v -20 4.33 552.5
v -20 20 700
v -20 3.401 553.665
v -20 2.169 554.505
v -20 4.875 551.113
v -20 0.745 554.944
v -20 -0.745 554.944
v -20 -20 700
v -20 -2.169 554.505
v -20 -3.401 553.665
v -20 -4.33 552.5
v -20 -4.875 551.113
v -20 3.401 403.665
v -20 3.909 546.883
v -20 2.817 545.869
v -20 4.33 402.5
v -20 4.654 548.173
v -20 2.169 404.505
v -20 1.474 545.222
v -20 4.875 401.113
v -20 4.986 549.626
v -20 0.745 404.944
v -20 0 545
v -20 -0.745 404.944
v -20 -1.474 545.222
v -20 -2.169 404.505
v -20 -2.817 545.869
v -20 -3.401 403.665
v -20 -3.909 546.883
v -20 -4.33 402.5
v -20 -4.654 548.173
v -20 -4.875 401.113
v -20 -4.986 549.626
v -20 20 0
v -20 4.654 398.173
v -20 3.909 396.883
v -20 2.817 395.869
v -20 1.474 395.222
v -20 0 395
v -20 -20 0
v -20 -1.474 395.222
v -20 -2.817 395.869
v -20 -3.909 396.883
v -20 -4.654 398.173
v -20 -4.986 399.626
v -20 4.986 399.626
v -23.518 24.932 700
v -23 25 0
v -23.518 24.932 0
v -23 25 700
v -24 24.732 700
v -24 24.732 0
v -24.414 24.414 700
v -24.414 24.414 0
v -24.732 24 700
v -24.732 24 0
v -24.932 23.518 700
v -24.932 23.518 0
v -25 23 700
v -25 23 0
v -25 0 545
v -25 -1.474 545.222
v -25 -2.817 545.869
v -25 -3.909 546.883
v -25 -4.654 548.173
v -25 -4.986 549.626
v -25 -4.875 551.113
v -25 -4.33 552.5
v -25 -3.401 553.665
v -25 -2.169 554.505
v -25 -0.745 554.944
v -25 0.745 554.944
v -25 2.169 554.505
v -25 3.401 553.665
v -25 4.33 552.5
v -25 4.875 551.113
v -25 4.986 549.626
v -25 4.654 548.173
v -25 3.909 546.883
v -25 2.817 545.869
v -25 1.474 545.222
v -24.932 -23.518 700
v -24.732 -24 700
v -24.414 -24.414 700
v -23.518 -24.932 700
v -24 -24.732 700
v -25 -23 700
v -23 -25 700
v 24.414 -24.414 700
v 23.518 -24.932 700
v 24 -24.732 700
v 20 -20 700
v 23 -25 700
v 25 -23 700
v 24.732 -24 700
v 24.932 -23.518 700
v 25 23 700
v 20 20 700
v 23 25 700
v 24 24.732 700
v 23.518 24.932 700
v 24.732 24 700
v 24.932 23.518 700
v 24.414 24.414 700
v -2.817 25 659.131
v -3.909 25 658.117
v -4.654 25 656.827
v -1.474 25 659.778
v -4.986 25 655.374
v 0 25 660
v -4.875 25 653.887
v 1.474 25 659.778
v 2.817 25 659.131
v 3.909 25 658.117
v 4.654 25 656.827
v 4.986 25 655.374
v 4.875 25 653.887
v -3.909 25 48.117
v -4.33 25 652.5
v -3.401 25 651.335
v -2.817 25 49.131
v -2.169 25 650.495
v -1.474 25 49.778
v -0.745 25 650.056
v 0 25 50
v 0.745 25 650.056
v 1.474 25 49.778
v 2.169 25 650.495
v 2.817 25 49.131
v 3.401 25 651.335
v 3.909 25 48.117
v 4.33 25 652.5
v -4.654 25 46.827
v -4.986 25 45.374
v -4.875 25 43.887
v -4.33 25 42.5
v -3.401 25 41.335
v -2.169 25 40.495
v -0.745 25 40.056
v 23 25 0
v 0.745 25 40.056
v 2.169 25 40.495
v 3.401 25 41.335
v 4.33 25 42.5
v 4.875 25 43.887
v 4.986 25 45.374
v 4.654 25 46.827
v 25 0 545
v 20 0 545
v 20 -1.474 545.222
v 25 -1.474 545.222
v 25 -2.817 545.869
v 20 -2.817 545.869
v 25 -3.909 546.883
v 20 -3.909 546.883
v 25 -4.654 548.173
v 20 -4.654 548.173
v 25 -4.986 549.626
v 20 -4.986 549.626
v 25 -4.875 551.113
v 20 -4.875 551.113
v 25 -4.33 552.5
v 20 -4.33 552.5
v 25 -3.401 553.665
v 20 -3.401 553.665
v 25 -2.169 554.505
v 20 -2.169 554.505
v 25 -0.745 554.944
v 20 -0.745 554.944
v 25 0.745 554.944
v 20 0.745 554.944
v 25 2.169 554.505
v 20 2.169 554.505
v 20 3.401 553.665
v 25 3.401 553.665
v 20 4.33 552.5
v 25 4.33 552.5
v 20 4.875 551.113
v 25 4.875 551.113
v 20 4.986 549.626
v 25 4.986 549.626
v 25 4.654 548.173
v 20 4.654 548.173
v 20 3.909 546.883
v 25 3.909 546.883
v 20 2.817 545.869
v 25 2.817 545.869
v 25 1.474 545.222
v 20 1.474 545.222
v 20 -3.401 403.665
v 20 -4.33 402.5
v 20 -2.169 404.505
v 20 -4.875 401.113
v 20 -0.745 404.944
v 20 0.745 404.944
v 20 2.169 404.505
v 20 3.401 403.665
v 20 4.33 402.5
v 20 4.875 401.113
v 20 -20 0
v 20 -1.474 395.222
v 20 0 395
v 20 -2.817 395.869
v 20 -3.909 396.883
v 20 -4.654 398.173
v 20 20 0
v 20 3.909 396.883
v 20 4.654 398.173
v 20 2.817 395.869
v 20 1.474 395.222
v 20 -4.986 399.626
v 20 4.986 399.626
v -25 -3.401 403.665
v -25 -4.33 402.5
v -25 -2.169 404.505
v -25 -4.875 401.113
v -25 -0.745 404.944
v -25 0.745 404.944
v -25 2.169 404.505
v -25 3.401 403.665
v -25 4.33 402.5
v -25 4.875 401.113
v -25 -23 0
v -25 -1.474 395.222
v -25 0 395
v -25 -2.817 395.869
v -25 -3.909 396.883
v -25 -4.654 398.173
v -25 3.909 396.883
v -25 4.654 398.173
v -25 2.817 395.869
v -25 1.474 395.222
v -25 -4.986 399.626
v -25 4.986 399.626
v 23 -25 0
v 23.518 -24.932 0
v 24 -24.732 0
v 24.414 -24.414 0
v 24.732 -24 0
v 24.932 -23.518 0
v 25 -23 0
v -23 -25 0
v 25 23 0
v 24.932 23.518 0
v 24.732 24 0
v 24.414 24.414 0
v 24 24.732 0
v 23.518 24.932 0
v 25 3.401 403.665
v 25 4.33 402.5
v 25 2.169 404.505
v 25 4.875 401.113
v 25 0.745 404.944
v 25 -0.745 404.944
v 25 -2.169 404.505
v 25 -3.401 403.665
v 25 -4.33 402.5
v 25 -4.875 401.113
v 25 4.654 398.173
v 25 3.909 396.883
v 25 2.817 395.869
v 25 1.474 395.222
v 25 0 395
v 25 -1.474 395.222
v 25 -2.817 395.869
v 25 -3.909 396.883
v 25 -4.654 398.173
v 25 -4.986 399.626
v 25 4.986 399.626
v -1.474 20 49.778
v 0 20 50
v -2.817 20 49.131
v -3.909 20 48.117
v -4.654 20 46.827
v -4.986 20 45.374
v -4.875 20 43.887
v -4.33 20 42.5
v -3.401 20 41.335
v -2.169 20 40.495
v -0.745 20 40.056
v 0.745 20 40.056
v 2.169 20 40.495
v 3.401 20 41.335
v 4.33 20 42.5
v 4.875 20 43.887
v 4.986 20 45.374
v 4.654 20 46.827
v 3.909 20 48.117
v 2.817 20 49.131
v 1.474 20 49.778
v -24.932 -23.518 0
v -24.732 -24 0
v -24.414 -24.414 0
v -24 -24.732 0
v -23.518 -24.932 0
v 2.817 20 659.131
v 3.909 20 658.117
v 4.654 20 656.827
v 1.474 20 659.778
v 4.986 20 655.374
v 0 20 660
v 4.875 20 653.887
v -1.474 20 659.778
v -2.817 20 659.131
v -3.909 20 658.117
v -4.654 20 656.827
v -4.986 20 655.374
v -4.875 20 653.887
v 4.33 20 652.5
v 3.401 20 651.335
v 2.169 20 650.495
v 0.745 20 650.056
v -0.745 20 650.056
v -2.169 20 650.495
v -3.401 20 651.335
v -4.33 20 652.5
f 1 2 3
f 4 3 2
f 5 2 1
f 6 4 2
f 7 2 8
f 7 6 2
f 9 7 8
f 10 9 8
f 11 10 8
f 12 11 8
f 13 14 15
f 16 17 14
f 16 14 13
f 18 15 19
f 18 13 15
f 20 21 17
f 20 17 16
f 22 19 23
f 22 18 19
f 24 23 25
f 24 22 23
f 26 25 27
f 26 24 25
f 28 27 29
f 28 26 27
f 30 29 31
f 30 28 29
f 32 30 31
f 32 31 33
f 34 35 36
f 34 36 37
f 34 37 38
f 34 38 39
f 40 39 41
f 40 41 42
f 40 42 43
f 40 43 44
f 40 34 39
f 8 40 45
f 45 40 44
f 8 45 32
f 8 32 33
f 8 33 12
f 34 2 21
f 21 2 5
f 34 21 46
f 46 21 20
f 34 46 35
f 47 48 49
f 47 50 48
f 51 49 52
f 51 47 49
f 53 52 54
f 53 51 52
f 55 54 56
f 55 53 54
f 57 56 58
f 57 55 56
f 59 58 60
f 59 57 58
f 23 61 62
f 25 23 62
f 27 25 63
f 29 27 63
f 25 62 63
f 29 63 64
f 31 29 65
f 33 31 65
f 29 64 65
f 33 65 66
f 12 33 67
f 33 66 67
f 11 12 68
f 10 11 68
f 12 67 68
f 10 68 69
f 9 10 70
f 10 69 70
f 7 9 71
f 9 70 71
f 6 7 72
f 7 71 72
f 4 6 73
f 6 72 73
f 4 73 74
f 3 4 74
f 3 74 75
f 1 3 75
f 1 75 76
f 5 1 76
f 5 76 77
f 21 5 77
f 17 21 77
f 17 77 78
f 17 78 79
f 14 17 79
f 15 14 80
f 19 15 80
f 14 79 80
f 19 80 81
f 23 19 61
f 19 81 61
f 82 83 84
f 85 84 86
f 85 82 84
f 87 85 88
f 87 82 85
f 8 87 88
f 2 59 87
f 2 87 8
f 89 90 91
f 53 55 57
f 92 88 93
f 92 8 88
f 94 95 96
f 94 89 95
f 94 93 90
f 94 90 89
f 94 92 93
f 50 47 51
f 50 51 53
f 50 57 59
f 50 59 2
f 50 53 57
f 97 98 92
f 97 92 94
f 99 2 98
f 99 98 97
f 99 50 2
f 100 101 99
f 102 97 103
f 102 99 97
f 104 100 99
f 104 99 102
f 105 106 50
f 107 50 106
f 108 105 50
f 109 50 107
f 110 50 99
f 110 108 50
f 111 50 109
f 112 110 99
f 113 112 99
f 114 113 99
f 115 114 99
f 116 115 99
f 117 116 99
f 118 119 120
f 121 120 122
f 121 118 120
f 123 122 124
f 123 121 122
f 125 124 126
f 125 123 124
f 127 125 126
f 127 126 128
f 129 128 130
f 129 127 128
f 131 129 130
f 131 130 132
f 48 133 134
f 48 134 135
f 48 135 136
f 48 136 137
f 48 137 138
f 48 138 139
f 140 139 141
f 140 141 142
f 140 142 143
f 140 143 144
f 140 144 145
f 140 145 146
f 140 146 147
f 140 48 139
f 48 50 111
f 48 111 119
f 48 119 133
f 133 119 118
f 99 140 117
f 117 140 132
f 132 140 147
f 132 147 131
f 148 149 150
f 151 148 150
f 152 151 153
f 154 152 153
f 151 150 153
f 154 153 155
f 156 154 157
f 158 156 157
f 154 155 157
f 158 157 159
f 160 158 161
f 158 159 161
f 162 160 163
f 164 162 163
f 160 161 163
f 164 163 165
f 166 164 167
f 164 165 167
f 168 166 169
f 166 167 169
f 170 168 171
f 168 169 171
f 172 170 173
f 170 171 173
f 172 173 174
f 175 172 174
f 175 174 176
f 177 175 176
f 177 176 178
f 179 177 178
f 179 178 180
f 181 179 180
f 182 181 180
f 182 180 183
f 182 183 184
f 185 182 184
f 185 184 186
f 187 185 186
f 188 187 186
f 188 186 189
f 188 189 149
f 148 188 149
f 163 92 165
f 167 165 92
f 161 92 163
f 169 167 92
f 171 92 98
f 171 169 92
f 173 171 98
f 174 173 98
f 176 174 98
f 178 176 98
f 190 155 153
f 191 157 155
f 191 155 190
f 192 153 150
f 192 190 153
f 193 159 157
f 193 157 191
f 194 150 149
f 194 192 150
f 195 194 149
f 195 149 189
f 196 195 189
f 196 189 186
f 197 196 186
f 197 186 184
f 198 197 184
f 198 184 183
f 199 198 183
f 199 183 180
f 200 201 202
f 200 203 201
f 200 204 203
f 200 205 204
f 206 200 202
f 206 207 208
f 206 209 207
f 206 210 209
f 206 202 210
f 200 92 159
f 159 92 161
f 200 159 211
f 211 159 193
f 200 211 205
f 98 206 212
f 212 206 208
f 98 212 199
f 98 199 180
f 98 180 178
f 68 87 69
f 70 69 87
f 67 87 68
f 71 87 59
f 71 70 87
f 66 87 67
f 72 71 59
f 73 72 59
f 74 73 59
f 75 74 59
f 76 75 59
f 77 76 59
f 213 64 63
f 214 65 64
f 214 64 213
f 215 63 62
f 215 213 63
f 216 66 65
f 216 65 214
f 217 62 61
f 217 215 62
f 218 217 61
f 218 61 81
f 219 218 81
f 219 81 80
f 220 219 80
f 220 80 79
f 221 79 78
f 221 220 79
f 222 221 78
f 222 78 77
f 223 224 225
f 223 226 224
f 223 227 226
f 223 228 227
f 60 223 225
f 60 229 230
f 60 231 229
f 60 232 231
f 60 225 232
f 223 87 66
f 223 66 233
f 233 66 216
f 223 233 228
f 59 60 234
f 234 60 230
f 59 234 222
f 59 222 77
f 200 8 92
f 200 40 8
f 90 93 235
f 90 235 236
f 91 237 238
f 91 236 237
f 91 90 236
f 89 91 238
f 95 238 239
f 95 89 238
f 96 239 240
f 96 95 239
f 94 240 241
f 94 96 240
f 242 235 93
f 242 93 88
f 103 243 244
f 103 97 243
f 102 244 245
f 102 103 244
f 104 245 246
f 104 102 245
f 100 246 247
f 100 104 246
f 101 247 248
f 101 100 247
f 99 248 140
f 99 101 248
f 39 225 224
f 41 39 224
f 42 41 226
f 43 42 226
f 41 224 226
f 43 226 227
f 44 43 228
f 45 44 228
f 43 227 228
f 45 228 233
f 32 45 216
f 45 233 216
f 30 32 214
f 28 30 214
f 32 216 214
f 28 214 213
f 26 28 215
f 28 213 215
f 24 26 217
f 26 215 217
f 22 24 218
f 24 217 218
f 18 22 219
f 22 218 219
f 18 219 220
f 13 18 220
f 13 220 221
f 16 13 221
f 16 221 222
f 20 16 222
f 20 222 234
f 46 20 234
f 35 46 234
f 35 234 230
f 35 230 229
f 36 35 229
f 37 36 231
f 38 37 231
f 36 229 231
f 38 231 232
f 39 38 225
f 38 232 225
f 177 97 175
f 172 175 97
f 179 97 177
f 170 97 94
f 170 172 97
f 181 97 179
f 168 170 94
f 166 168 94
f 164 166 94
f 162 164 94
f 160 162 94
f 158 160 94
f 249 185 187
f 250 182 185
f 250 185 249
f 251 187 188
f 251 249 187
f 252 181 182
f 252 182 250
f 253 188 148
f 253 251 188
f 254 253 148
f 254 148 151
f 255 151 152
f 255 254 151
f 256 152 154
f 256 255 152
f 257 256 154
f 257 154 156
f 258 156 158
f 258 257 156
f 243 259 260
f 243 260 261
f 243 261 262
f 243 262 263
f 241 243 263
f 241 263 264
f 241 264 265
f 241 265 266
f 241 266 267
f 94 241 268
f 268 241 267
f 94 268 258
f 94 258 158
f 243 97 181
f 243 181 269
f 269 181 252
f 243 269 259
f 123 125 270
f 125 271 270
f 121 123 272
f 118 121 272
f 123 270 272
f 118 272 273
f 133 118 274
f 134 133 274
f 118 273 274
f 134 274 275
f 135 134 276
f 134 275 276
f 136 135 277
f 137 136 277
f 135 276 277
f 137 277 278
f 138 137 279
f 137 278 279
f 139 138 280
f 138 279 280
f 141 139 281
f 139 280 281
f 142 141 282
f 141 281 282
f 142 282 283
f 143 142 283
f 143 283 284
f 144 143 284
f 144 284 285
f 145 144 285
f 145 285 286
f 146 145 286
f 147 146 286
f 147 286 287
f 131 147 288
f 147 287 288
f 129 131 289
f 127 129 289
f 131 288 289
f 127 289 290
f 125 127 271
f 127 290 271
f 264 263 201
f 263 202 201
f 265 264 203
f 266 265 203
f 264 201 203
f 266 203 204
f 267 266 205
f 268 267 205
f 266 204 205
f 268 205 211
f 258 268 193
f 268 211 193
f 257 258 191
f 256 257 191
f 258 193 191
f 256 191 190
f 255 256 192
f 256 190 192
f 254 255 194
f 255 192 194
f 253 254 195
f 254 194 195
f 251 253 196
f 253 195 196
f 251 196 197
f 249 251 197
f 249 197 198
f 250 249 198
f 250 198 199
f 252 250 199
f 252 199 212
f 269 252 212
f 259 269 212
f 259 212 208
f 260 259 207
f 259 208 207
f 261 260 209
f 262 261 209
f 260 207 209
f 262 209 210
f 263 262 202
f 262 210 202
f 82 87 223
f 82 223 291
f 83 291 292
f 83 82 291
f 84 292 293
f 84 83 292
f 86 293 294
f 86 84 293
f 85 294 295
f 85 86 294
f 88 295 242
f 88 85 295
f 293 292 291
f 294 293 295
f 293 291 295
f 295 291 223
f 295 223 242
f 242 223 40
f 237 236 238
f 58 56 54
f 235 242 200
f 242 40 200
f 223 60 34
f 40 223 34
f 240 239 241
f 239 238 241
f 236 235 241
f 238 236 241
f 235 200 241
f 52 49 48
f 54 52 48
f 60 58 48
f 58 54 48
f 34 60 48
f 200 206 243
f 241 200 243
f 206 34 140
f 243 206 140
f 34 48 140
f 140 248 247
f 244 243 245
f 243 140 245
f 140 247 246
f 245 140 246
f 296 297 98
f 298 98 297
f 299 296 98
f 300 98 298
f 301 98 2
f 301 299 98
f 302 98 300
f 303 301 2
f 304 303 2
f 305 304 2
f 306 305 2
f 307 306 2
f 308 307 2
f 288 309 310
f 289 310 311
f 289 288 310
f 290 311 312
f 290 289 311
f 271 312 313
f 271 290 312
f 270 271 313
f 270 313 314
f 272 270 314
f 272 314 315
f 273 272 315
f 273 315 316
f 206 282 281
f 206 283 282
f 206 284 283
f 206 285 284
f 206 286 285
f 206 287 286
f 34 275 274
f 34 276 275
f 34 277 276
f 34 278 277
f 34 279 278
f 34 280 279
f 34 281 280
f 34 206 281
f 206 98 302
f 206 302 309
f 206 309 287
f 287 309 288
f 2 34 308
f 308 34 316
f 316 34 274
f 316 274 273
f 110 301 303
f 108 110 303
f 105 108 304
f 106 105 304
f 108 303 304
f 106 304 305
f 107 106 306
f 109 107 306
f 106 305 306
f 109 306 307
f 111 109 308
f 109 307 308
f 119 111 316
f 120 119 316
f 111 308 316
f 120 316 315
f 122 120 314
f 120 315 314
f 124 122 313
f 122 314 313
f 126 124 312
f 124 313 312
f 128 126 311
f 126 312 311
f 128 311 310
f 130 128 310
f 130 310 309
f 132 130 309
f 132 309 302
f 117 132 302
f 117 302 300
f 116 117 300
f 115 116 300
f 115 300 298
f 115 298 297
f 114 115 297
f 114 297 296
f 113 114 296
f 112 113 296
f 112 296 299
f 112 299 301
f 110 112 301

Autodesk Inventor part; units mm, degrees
ref_plane "YZ Plane" through (0, 0, 0) normal (1, 0, 0) x (0, 1, 0)
ref_plane "XZ Plane" through (0, 0, 0) normal (0, 1, 0) x (-1, 0, 0)
ref_plane "XY Plane" through (0, 0, 0) normal (0, 0, 1) x (1, 0, 0)
sketch "Sketch1" plane through (0, 0, 0) normal (0, 0, 1) x (1, 0, 0)
  line L0 (-25, 25) -> (25, 25)
  line L1 (25, 25) -> (25, -25)
  line L2 (25, -25) -> (-25, -25)
  line L3 (-25, -25) -> (-25, 25)
  line L4 (20, 20) -> (-20, 20)
  line L5 (-20, 20) -> (-20, -20)
  line L6 (-20, -20) -> (20, -20)
  line L7 (20, -20) -> (20, 20)
  point P0 (0, 0)
  dimension "d0" = 50
  dimension "d1" = 50
  dimension "d2" = 25
  dimension "d3" = 25
  dimension "d4" = 5
extrude "Extrusion1" add sketch "Sketch1" along normal blind 700
fillet "Fillet1" radius 2 4 edges at (25, 25, 350) (-25, 25, 350) (25, -25, 350) (-25, -25, 350)
sketch "Sketch2" plane through (-23, 25, 0) normal (0, 1, 0) x (1, 0, 0)
  line L0 (46, 0) -> (0, 0) projected
  line L1 (46, -700) -> (0, -700) projected
  point P0 (23, 0)
  point P1 (23, -45)
  point P2 (23, -655)
  dimension "d8" = 45
  dimension "d9" = 0
  dimension "d10" = 45
  dimension "d11" = 0
hole "endHoles" at (0, 25, 45) at (0, 25, 655) direction (0, -1, 0) diameter 10 depth 5
sketch "Sketch3" plane through (25, -23, 0) normal (1, 0, 0) x (0, 0, -1)
  line L0 (0, 23) -> (-550, 23)
  point P0 (-400, 23)
  dimension "d19" = 400
  dimension "d21" = 0
  dimension "d22" = 0
  dimension "d49" = 150
hole "Hole4" at (25, 0, 400) at (25, 0, 550) direction (-1, 0, 0) diameter 10 end through all
equation "\"d0\" = w"
equation "\"d1\" = w"
equation "\"d2\" = 0.5 * d1"
equation "\"d3\" = 0.5 * d0"
equation "\"d4\" = t"
equation "\"support_frame_endHoleBuffer\" = 45"
equation "\"d7\" = fillet"
equation "\"d8\" = buffer"
equation "\"d10\" = buffer"
equation "\"d42\" = support_frame_clampHoleDiameter"
equation "\"w\" = support_frame_squareBarDimension"
equation "\"t\" = support_frame_squareBarThickness"
equation "\"fillet\" = support_frame_squareBarFillet"
equation "\"buffer\" = support_frame_endHoleBuffer"
equation "\"hoop_angle_z\" = 45deg"
equation "\"hoop_bearing_length\" = 5deg"
equation "\"hoop_cable_diam\" = 5"
equation "\"hoop_cable_pulley_diam\" = 22"
equation "\"hoop_thickness_large\" = 4"
equation "\"hoop_thickness_medium\" = 3.2"
equation "\"hoop_thickness_small\" = 2"
equation "\"hoop_width_large\" = 51"
equation "\"hoop_width_medium\" = 33.7"
equation "\"hoop_width_small\" = 25.4"
equation "\"rack_tooth_addendum\" = 5"
equation "\"rack_tooth_dedendum\" = 5"
equation "\"rack_tooth_thickness\" = 5"
equation "\"secure_arm_angle\" = 35deg"
equation "\"secure_arm_radii\" = 9"
equation "\"support_baseClamp_platformLengthBuffer\" = 35"
equation "\"support_baseClamp_platformThickness\" = 15"
equation "\"support_baseClamp_platformWidthBuffer\" = 0"
equation "\"support_baseClamp_sleeveHoleDiameter\" = 12"
equation "\"support_baseClamp_sleeveSweepTerminationAngle\" = 55deg"
equation "\"support_baseClamp_thickness\" = 8"
equation "\"support_frame_clampHoleDiameter\" = 10"
equation "\"support_frame_squareBarFillet\" = 2"
equation "\"support_frame_squareBarThickness\" = 5"
equation "\"hoop_tabs_thickness\" = 6"
equation "\"wheelchair_deployed_length\" = 1067"
equation "\"wheelchair_deployed_height\" = 914"
equation "\"hoop_tabs_hole\" = 12"
equation "\"wheelchair_deployed_width\" = 635"
equation "\"sm_varx_pinPlate_thickness\" = 5"
equation "\"sm_varx_member_tolerance\" = 0.5"
equation "\"sm_varx_pinPlate_holeDiameter\" = 5"
equation "\"sm_varx_squareBarThickness\" = 2.5"
equation "\"hoop_bushing23_radialInterference\" = 0"
equation "\"hoop_bushing12_radialInterference\" = 0"
equation "\"hoop_bushing12_od\" = -2 * hoop_thickness_large + hoop_width_large + hoop_bushing12_radialInterference"
equation "\"wheelchatir_pos_deploy_angle_0\" = 65deg"
equation "\"wheelchatir_pos_store_angle_0\" = 90deg"
equation "\"wheelchatir_pos_deploy_angle_1\" = 20deg"
equation "\"wheelchatir_pos_store_angle_1\" = 20deg"
equation "\"hoop_bushing23_od\" = -2 * hoop_thickness_medium + hoop_width_medium + hoop_bushing23_radialInterference"
equation "\"hoop_bushing12_thickness\" = -hoop_width_medium + hoop_bushing12_od - 2 * hoop_bushing12_radialInterference"
equation "\"hoop_bushing23_thickness\" = -hoop_width_small + hoop_bushing23_od - 2 * hoop_bushing23_radialInterference"
equation "\"support_frame_squareBarDimension\" = 50"
properties part number "support_frame_x" material "Steel, Mild"
